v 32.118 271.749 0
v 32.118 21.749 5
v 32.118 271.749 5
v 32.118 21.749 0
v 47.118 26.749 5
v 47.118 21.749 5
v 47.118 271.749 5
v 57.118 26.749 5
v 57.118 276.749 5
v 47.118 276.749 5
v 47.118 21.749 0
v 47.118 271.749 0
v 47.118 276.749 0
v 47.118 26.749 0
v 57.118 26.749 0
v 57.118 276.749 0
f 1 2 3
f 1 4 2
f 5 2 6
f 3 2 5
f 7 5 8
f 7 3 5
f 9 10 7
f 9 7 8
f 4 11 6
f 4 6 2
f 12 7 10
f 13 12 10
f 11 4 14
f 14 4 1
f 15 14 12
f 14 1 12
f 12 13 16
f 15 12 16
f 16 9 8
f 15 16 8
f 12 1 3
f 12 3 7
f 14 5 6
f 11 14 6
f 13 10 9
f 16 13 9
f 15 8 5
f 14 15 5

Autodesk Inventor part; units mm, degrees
ref_plane "YZ Plane" through (0, 0, 0) normal (1, 0, 0) x (0, 1, 0)
ref_plane "XZ Plane" through (0, 0, 0) normal (0, 1, 0) x (-1, 0, 0)
ref_plane "XY Plane" through (0, 0, 0) normal (0, 0, 1) x (1, 0, 0)
sketch "Sketch1" plane through (0, 0, 0) normal (0, 0, 1) x (1, 0, 0)
  line L0 (32.1184, 271.7487) -> (82.1184, 271.7487)
  line L1 (82.1184, 271.7487) -> (82.1184, 21.7487)
  line L2 (82.1184, 21.7487) -> (32.1184, 21.7487)
  line L3 (32.1184, 21.7487) -> (32.1184, 271.7487)
  point P0 (0, 0)
  dimension "d0" = 50
  dimension "d1" = 250
extrude "Extrusion1" add sketch "Sketch1" along normal blind 5
sketch "Sketch2" plane through (0, 0, 5) normal (0, 0, 1) x (1, 0, 0)
  line L0 (82.1184, 271.7487) -> (32.1184, 271.7487) projected
  line L1 (57.1184, 271.7487) -> (47.1184, 271.7487)
  line L2 (47.1184, 271.7487) -> (47.1184, 276.7487)
  line L3 (47.1184, 276.7487) -> (67.1184, 276.7487)
  line L4 (67.1184, 276.7487) -> (67.1184, 271.7487)
  line L5 (32.1184, 21.7487) -> (82.1184, 21.7487) projected
  line L6 (32.1184, 21.7487) -> (32.1184, 16.7487)
  line L7 (32.1184, 16.7487) -> (47.1184, 16.7487)
  line L8 (47.1184, 16.7487) -> (47.1184, 21.7487)
  line L9 (82.1184, 21.7487) -> (82.1184, 16.7487)
  line L10 (82.1184, 16.7487) -> (67.1184, 16.7487)
  line L11 (67.1184, 16.7487) -> (67.1184, 21.7487)
  point P0 (0, 0)
  dimension "d4" = 10
  dimension "d5" = 5
  dimension "d6" = 20
  dimension "d7" = 5
  dimension "d8" = 15
  dimension "d9" = 5
  dimension "d10" = 15
extrude "Extrusion2" add sketch "Sketch2" against normal blind 5 contours L0 L2 L3 L4
sketch "Sketch3" plane through (0, 0, 5) normal (0, 0, 1) x (1, 0, 0)
  line L0 (32.1184, 21.7487) -> (82.1184, 21.7487) projected
  line L1 (32.1184, 21.7487) -> (32.1184, 16.7487)
  line L2 (32.1184, 16.7487) -> (47.1184, 16.7487)
  line L3 (47.1184, 16.7487) -> (47.1184, 21.7487)
  line L4 (82.1184, 21.7487) -> (82.1184, 16.7487)
  line L5 (82.1184, 16.7487) -> (67.1184, 16.7487)
  line L6 (67.1184, 16.7487) -> (67.1184, 21.7487)
  point P0 (0, 0)
  dimension "d13" = 5
  dimension "d14" = 15
  dimension "d15" = 5
  dimension "d16" = 15
extrude "Extrusion3" add sketch "Sketch3" against normal blind 5
sketch "Sketch4" plane through (0, 0, 5) normal (0, 0, 1) x (1, 0, 0)
  line L0 (47.1184, 21.7487) -> (67.1184, 21.7487) projected
  line L1 (57.1184, 21.7487) -> (57.1184, 26.7487)
  line L2 (57.1184, 26.7487) -> (47.1184, 26.7487)
  line L3 (47.1184, 26.7487) -> (47.1184, 21.7487)
  line L4 (47.1184, 21.7487) -> (67.1184, 21.7487)
  line L5 (67.1184, 21.7487) -> (67.1184, 26.7487)
  line L6 (67.1184, 26.7487) -> (57.1184, 26.7487)
  line L7 (47.1184, 21.7487) -> (32.1184, 21.7487)
  line L8 (32.1184, 21.7487) -> (82.1184, 21.7487)
  line L9 (82.1184, 16.7487) -> (82.1184, 271.7487) projected
  point P0 (0, 0)
  dimension "d19" = 5
  dimension "d20" = 10
  dimension "d21" = 15
sketch "Sketch5" plane through (0, 0, 5) normal (0, 0, 1) x (1, 0, 0)
  point P0 (0, 0)
sketch "Sketch6" plane through (0, 0, 5) normal (0, 0, 1) x (1, 0, 0)
  line L0 (47.1184, 21.7487) -> (67.1184, 21.7487) projected
  line L1 (47.1184, 21.7487) -> (47.1184, 16.7487) projected
  line L2 (47.1184, 21.7487) -> (47.1184, 16.7487)
  line L3 (32.1184, 271.7487) -> (32.1184, 16.7487) projected
  line L4 (47.1184, 16.7487) -> (32.1184, 16.7487)
  line L5 (32.1184, 16.7487) -> (32.1184, 21.7487)
  line L6 (47.1184, 21.7487) -> (32.1184, 21.7487)
  line L7 (32.1184, 21.7487) -> (32.1184, 16.7487)
  line L8 (32.1184, 16.7487) -> (47.1184, 16.7487)
  point P0 (0, 0)
extrude "Extrusion4" cut sketch "Sketch6" against normal blind 15
extrude "Extrusion5" cut sketch "Sketch4" against normal blind 15
sketch "Sketch7" plane through (0, 0, 5) normal (0, 0, 1) x (1, 0, 0)
  line L0 (67.1184, 26.7487) -> (67.1184, 16.7487) projected
  line L1 (67.1184, 21.7487) -> (67.1184, 16.7487)
  line L2 (82.1184, 16.7487) -> (82.1184, 271.7487) projected
  line L3 (67.1184, 16.7487) -> (82.1184, 16.7487)
  line L4 (82.1184, 16.7487) -> (82.1184, 21.7487)
  line L5 (67.1184, 21.7487) -> (82.1184, 21.7487)
  point P0 (0, 0)
extrude "Extrusion6" cut sketch "Sketch7" against normal blind 15
sketch "Sketch8" plane through (0, 0, 5) normal (0, 0, 1) x (1, 0, 0)
  line L0 (47.1184, 276.7487) -> (67.1184, 276.7487) projected
  line L1 (57.1184, 276.7487) -> (57.1184, 26.7487)
  line L2 (67.1184, 26.7487) -> (47.1184, 26.7487) projected
  point P0 (0, 0)
sketch "Sketch9" plane through (0, 0, 5) normal (0, 0, 1) x (1, 0, 0)
  line L0 (47.1184, 276.7487) -> (67.1184, 276.7487) projected
  line L1 (57.1184, 276.7487) -> (57.1184, 26.7487)
  line L2 (67.1184, 26.7487) -> (47.1184, 26.7487) projected
  line L3 (67.1184, 21.7487) -> (67.1184, 26.7487) projected
  line L4 (67.1184, 26.7487) -> (67.1184, 21.7487)
  line L5 (82.1184, 271.7487) -> (82.1184, 21.7487) projected
  line L6 (67.1184, 21.7487) -> (82.1184, 21.7487)
  line L7 (82.1184, 21.7487) -> (82.1184, 271.7487)
  line L8 (82.1184, 271.7487) -> (67.1184, 271.7487)
  line L9 (67.1184, 271.7487) -> (67.1184, 276.7487)
  line L10 (67.1184, 276.7487) -> (57.1184, 276.7487)
  line L11 (67.1184, 276.7487) -> (67.1184, 271.7487)
  point P0 (0, 0)
extrude "Extrusion7" cut sketch "Sketch9" against normal blind 15
equation "\"d22\" = d21"
equation "\"d24\" = d21"
equation "\"d26\" = d21"
equation "\"d28\" = d21"
properties material "Steel, Carbon"
